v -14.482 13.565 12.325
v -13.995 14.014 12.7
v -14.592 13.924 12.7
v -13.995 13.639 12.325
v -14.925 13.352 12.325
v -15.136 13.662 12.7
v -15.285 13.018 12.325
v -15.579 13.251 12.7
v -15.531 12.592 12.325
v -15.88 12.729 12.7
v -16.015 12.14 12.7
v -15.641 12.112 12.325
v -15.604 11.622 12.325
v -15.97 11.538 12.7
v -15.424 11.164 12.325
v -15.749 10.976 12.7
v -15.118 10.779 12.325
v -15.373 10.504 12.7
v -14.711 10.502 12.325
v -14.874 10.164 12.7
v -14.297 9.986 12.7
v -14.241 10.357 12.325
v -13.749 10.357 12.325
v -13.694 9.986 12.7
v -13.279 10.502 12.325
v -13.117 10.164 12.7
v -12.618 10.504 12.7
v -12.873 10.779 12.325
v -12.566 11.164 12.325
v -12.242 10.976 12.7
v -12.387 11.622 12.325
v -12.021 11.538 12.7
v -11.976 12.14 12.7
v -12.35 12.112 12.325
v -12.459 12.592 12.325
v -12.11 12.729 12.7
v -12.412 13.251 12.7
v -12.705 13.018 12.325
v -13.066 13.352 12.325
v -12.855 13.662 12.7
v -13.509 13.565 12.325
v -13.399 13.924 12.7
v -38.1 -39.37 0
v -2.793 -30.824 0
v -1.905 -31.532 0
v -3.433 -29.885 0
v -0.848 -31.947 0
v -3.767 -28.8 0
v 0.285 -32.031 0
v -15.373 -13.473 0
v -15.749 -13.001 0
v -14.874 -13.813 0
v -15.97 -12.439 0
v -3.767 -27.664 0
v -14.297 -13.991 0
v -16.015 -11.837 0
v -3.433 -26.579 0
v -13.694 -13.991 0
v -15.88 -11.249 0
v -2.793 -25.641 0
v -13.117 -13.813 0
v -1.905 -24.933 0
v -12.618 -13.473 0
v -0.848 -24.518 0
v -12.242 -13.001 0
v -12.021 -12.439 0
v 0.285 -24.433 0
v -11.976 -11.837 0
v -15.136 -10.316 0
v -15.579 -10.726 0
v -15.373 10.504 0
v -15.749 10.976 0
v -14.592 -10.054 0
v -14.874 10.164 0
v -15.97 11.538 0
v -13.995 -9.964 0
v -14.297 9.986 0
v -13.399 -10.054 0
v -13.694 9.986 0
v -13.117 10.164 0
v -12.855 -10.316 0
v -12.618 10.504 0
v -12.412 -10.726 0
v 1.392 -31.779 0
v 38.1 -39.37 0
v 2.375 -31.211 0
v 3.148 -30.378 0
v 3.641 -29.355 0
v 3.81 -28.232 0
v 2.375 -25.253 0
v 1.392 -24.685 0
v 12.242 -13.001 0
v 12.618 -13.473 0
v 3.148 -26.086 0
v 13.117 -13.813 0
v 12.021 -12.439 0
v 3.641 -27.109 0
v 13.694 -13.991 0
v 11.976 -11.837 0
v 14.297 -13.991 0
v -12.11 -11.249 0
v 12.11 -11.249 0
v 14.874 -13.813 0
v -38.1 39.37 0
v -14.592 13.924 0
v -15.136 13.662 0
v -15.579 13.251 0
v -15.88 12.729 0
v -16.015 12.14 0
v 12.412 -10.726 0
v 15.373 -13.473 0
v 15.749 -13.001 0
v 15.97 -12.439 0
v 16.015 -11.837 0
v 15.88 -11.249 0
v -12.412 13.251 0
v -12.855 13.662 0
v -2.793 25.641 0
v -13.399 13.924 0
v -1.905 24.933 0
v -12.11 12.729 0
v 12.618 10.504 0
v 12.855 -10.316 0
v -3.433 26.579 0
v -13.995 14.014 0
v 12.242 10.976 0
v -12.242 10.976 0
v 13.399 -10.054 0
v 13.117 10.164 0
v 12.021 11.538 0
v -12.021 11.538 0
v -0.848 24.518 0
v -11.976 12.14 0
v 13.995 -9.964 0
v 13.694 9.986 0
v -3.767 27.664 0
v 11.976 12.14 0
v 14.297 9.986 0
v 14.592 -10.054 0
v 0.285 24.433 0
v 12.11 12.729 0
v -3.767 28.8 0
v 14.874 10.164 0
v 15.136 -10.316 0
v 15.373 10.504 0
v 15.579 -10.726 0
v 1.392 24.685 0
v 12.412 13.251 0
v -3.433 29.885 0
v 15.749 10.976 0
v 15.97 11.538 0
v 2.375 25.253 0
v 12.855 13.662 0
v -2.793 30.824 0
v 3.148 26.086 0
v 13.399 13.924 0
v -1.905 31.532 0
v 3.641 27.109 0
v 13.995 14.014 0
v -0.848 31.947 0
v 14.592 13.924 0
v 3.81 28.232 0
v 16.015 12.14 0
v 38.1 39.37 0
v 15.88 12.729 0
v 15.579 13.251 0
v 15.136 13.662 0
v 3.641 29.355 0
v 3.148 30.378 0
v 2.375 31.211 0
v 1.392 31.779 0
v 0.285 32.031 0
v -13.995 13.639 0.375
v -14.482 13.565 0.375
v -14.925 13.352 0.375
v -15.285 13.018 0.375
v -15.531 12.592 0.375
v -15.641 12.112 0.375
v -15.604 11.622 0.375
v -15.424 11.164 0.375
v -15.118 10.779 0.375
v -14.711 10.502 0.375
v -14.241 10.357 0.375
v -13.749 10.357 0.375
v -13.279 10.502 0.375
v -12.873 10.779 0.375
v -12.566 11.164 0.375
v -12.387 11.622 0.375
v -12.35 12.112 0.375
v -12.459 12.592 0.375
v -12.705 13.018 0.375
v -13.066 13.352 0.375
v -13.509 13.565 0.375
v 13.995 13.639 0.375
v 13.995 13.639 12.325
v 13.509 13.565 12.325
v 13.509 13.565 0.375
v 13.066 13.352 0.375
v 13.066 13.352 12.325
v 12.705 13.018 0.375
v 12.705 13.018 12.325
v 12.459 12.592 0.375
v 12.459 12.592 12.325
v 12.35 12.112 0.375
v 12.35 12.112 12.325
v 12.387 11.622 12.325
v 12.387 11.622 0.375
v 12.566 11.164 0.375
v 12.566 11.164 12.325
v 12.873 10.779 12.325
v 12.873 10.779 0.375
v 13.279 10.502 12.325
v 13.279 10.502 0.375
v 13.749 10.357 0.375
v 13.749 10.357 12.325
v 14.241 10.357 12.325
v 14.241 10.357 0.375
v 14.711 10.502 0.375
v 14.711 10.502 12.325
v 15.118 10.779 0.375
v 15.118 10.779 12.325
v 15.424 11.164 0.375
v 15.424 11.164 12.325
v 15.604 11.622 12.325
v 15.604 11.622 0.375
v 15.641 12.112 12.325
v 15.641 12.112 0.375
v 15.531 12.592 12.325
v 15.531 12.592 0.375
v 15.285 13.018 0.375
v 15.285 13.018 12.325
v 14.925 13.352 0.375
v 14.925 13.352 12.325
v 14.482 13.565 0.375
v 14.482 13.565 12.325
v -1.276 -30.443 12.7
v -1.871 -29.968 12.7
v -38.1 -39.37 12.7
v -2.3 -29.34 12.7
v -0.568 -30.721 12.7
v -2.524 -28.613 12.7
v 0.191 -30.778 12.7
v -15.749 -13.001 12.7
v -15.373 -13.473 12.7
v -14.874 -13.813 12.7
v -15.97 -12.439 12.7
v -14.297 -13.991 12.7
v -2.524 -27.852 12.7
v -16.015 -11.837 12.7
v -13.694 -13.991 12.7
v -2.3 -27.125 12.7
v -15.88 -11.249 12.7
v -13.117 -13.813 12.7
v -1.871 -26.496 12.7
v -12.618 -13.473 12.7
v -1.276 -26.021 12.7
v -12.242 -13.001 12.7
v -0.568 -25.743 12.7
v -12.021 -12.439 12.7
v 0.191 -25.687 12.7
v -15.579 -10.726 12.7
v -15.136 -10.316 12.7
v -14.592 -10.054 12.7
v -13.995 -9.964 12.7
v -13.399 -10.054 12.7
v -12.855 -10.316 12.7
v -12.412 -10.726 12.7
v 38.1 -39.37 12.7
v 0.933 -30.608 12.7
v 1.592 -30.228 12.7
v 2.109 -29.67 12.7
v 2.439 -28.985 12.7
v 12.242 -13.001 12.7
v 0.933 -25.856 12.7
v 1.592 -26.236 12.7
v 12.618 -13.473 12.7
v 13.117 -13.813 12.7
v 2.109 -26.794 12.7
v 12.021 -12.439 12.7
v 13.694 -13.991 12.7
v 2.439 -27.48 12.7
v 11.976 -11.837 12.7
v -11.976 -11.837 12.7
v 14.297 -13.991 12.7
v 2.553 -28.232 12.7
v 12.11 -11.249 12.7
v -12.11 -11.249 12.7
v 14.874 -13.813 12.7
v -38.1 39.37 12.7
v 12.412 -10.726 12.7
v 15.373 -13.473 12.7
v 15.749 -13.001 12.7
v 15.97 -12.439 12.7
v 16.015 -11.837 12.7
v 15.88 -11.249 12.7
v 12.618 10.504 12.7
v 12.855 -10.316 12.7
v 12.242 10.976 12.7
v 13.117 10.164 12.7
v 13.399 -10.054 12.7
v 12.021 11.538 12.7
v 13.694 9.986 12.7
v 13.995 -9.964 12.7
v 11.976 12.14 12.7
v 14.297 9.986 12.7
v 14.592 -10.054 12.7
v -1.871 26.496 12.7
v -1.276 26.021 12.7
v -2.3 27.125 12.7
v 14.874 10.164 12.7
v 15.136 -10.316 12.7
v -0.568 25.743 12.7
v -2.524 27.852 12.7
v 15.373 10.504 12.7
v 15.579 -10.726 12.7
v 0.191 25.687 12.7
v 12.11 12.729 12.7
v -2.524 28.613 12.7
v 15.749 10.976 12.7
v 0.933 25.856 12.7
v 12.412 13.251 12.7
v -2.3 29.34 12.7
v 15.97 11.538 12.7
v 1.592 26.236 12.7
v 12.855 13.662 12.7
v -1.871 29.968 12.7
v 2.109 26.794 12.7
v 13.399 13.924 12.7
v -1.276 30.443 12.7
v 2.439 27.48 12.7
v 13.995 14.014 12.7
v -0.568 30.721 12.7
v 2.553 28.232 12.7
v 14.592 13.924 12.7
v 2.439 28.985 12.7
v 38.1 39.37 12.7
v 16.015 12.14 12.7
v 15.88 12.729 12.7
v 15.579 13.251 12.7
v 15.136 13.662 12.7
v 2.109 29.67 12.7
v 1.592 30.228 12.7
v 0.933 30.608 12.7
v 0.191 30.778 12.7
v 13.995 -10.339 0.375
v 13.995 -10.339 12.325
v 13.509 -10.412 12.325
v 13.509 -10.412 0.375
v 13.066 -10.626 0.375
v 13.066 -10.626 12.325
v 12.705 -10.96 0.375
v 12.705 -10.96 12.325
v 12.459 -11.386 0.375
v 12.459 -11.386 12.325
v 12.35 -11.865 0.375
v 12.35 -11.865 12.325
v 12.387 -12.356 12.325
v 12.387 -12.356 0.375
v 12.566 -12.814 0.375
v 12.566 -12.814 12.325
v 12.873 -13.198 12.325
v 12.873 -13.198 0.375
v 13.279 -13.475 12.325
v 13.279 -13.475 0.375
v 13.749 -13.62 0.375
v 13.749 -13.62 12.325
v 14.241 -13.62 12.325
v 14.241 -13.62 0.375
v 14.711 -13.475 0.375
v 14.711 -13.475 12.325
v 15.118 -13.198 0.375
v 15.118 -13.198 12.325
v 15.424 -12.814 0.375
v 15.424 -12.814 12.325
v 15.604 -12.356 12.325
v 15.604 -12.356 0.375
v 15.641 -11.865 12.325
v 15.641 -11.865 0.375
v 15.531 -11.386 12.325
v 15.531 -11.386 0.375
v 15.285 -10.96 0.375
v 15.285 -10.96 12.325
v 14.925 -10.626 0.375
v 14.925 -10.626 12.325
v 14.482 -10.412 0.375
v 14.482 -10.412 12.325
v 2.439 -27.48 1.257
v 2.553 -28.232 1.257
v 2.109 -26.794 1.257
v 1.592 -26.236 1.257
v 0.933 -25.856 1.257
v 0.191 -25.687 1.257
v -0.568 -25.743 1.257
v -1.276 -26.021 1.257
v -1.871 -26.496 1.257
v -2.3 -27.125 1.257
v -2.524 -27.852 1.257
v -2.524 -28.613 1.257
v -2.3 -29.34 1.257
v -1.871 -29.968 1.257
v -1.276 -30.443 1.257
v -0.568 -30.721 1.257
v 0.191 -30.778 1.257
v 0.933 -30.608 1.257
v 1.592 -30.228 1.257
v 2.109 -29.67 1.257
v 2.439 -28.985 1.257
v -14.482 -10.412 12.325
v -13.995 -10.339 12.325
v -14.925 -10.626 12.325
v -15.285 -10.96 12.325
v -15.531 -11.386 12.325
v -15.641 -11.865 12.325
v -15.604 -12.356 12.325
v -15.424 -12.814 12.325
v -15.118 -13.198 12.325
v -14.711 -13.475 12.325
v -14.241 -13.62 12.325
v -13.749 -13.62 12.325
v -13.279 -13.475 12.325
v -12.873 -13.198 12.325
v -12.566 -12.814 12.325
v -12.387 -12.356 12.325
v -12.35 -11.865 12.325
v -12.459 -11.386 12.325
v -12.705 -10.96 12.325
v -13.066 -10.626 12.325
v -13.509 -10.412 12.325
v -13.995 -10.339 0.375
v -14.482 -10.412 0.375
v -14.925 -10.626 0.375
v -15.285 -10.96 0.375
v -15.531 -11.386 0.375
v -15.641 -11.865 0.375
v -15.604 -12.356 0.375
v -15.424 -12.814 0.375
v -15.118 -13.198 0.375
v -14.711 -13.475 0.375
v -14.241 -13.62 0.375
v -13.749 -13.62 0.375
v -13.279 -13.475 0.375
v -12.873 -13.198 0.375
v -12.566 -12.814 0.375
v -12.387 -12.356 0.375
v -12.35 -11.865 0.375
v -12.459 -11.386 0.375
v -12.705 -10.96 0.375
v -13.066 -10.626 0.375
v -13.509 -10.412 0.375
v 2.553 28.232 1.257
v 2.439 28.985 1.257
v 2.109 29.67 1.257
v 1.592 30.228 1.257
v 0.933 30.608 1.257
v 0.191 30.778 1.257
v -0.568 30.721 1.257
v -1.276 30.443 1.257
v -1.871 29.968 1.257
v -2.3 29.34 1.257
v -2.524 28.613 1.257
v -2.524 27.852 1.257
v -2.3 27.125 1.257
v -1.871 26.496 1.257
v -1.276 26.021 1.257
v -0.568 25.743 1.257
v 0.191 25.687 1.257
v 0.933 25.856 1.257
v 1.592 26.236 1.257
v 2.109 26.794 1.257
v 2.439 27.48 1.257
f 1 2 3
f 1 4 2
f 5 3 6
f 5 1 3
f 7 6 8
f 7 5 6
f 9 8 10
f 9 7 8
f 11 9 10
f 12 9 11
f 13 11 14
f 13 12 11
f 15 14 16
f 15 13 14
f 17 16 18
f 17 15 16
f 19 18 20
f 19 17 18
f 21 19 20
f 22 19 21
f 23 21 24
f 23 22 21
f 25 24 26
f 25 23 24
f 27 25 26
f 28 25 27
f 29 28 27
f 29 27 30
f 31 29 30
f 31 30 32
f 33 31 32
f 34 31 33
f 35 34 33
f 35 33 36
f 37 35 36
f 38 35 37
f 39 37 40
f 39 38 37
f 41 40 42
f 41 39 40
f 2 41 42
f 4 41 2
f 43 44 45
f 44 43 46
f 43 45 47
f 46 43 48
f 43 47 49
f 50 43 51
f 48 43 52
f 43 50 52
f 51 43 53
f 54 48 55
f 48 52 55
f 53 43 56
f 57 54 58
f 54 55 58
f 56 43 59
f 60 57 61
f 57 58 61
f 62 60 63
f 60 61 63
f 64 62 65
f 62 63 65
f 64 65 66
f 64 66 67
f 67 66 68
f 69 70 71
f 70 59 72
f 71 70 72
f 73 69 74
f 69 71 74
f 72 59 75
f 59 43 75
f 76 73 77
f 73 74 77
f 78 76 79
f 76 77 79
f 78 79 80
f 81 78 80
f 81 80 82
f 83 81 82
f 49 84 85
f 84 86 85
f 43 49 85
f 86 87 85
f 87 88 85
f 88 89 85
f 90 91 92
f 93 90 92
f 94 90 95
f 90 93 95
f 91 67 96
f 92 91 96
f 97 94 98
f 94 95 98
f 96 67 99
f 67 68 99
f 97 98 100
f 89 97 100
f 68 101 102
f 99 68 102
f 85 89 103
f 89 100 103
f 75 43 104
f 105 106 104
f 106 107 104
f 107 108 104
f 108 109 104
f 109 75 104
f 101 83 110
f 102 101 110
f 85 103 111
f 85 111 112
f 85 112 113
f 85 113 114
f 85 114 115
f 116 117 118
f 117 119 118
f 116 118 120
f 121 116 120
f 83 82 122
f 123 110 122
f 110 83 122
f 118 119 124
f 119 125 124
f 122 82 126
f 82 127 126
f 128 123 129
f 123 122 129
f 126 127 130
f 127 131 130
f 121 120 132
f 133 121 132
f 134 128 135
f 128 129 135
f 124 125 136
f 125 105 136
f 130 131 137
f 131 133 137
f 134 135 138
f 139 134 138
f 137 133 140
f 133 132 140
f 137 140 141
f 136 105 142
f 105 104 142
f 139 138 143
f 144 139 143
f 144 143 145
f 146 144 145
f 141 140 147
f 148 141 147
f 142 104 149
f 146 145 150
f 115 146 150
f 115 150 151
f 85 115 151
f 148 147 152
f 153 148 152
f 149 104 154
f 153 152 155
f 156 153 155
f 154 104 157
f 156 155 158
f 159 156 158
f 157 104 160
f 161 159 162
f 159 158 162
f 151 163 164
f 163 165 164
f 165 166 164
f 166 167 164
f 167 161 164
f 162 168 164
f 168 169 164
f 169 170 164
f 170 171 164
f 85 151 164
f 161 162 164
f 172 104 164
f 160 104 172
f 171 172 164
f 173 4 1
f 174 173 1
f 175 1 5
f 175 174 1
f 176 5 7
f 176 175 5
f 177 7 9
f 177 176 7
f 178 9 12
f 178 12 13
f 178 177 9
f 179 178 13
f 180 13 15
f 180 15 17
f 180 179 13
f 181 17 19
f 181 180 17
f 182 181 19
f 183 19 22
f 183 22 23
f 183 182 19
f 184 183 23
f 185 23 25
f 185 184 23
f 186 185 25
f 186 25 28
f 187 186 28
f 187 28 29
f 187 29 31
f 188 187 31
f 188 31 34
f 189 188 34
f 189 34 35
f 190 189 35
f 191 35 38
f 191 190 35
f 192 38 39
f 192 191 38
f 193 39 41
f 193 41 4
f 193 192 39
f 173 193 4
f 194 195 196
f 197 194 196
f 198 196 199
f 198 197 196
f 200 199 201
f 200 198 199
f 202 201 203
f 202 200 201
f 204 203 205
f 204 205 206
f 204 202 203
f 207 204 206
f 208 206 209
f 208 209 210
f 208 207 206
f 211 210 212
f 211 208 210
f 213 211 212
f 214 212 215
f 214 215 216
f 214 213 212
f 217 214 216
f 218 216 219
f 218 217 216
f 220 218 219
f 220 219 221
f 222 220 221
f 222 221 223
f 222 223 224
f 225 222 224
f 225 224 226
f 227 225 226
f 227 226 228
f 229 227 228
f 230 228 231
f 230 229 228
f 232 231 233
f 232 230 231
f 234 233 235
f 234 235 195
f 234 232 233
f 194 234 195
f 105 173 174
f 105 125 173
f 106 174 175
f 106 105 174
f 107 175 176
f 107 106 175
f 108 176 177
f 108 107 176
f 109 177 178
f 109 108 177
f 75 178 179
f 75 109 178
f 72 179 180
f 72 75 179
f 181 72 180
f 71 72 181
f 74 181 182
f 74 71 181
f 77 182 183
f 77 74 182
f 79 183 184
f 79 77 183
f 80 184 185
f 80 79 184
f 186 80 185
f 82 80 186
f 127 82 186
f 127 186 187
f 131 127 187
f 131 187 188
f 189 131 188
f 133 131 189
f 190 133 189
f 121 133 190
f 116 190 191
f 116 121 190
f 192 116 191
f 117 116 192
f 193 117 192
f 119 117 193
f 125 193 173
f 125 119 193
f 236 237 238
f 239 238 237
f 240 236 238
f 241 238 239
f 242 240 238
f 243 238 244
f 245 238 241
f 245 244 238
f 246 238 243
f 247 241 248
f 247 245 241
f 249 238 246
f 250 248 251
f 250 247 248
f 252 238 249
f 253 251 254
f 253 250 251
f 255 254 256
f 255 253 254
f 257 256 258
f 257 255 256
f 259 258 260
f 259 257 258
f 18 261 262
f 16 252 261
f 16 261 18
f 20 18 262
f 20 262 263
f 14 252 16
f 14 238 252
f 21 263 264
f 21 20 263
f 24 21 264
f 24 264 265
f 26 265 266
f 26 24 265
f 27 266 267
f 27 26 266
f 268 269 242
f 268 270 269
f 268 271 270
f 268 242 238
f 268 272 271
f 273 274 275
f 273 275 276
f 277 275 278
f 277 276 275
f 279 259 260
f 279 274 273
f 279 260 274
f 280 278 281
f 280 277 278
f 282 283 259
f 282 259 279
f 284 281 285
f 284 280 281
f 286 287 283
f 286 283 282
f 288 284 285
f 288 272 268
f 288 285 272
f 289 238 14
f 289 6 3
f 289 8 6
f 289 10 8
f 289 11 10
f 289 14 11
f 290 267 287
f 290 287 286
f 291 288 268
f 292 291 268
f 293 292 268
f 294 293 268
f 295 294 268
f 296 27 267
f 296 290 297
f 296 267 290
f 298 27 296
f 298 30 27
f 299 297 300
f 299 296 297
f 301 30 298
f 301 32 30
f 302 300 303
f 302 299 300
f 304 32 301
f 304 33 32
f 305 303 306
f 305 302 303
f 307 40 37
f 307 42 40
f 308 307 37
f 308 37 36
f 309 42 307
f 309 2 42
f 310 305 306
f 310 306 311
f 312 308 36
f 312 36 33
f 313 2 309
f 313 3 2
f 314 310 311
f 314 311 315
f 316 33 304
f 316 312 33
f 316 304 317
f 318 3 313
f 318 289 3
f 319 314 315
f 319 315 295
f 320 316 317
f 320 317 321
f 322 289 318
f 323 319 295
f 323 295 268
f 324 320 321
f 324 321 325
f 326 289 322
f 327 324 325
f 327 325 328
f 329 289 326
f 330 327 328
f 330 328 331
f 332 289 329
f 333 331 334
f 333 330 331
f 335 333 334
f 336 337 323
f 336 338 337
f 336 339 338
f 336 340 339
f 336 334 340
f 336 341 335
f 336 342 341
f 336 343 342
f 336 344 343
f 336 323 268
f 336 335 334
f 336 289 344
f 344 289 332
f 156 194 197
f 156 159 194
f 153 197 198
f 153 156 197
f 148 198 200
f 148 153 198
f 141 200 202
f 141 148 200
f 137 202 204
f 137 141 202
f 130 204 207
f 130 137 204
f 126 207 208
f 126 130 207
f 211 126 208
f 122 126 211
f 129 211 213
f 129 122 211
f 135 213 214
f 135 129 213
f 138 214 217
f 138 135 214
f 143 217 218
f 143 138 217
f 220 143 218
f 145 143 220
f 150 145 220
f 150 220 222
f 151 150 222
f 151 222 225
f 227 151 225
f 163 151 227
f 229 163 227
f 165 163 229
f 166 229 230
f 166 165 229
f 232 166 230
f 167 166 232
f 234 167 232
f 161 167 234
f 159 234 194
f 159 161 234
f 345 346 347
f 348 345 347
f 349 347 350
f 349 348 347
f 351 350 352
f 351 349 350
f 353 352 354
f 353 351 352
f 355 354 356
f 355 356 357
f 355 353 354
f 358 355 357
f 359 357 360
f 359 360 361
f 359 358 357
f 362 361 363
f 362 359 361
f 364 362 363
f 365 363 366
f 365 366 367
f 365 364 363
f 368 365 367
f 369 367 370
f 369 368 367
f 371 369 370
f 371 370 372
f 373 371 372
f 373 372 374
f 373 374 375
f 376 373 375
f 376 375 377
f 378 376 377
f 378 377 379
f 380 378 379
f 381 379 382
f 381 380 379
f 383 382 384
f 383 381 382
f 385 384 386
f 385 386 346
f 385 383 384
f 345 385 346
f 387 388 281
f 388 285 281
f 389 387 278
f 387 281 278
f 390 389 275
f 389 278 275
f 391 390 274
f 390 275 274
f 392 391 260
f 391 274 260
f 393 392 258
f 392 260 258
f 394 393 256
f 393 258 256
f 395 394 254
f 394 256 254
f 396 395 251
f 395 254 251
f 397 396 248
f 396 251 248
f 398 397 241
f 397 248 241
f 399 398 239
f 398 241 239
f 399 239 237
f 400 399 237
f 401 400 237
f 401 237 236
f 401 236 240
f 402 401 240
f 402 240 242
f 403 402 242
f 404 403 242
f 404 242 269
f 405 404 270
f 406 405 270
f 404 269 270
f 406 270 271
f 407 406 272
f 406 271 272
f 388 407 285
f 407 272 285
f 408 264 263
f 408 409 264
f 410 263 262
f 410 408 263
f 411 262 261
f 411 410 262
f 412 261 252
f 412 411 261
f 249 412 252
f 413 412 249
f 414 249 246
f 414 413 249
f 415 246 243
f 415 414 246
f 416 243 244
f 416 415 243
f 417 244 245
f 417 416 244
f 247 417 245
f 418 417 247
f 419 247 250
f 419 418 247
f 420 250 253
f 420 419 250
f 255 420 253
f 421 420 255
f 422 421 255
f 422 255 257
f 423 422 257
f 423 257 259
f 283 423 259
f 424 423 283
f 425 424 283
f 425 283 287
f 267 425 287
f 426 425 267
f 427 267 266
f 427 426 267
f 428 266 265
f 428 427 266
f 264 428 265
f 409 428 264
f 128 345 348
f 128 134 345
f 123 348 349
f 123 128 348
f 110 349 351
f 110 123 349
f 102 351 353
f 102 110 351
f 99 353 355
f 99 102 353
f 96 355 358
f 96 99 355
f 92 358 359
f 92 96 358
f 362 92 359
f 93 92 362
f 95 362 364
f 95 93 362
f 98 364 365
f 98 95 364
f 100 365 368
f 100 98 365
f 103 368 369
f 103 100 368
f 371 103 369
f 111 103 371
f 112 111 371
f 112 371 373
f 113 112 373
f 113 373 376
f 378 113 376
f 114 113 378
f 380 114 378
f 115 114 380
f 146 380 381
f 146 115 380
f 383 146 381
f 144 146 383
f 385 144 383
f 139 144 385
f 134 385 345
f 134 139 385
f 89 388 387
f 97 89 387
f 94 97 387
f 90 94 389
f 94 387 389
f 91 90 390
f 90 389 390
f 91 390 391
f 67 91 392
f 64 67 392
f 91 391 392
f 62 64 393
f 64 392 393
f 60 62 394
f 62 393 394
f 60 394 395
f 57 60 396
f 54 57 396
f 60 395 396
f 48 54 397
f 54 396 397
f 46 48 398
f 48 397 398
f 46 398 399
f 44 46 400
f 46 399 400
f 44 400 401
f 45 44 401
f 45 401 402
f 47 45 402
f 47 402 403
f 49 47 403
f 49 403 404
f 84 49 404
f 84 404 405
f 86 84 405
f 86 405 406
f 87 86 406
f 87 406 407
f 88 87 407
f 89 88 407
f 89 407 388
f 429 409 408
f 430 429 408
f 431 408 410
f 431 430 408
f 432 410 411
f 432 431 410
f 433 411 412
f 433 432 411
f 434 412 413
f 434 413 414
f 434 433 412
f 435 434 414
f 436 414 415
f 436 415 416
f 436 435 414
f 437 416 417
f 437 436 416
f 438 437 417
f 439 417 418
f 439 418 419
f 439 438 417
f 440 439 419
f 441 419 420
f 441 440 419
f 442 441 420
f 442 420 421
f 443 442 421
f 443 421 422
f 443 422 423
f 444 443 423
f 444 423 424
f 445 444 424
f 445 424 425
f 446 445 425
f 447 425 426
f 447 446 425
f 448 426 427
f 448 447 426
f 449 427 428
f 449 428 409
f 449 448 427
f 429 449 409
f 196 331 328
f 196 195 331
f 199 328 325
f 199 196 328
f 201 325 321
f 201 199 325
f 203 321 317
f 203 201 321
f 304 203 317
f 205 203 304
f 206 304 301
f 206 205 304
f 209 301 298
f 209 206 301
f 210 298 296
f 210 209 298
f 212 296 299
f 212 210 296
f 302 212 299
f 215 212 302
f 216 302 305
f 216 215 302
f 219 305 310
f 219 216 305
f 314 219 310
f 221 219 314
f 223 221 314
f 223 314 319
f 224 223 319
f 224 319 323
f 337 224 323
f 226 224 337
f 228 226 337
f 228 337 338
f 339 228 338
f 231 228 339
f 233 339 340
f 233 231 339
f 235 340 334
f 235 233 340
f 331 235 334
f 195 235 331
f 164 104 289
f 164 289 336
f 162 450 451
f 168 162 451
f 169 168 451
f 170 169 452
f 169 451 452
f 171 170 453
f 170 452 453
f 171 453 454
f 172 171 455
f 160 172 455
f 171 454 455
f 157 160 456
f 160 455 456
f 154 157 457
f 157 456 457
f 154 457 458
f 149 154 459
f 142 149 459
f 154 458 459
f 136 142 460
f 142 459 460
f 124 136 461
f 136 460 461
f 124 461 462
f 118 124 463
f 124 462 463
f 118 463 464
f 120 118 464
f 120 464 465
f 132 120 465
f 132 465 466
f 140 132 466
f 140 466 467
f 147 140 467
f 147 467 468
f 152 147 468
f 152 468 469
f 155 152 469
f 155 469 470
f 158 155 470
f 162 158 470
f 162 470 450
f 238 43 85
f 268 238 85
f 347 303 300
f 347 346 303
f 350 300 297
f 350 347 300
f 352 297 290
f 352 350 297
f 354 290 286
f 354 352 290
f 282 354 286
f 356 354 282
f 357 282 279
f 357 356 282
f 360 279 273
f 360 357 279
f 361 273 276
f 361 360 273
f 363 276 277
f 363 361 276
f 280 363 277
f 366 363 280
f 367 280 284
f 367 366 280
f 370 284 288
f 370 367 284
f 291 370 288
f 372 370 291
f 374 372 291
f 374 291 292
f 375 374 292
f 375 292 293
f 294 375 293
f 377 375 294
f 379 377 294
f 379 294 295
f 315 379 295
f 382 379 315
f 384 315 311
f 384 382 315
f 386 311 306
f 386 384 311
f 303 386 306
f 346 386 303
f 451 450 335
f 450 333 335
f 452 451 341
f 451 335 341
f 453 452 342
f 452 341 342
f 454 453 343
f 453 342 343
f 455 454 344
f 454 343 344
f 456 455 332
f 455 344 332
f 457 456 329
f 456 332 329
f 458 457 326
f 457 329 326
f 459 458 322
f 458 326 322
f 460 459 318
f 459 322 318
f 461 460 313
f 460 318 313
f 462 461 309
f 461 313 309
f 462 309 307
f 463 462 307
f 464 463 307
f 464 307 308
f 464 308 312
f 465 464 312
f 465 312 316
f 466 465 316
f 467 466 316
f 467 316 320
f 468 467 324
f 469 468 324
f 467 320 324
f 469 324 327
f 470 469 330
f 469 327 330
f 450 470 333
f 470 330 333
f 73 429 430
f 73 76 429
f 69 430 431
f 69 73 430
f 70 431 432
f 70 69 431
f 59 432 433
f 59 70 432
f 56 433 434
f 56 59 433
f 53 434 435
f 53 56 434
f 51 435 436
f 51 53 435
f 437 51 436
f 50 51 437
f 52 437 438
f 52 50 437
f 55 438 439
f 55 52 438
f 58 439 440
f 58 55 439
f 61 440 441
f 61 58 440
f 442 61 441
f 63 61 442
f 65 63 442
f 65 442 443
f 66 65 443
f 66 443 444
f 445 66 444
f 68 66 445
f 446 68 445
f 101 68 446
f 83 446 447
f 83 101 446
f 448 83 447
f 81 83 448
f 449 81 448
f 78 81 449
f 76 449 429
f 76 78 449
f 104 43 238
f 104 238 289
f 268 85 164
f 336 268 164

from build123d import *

# Parameters (mm, degrees)
SKETCH1_W                         = 76.2
SKETCH1_H                         = 78.74
BOSS_EXTRUDE1_DEPTH               = 12.7
F_1_4_20_TAPPED_HOLE1_D           = 5.1054
F_1_4_20_TAPPED_HOLE1_CSINK_D     = 7.62
F_1_4_20_TAPPED_HOLE1_CSINK_ANGLE = 90
M4_TAPPED_HOLE1_AT_2_COUNT        = 2
M4_TAPPED_HOLE1_AT_2_PITCH        = 27.9908
M4_TAPPED_HOLE1_AT_3_COUNT        = 2
M4_TAPPED_HOLE1_AT_3_PITCH        = 36.856616589
M4_TAPPED_HOLE1_AT_4_COUNT        = 2
M4_TAPPED_HOLE1_AT_4_PITCH        = 23.9776


with BuildPart() as part:
    # Sketch1 → Boss-Extrude1 (new body)
    with BuildSketch(Plane.XY):
        Rectangle(SKETCH1_W, SKETCH1_H)
    extrude(amount=BOSS_EXTRUDE1_DEPTH)

    # 1/4-20 Tapped Hole1 (through all)
    with Locations(Plane(origin=(0, 0, 0), x_dir=(-1, 0, 0), z_dir=(0, 0, -1))):
        with Locations((0, 28.2321), (0, -28.2321)):
            CounterSinkHole(F_1_4_20_TAPPED_HOLE1_D / 2, F_1_4_20_TAPPED_HOLE1_CSINK_D / 2, counter_sink_angle=F_1_4_20_TAPPED_HOLE1_CSINK_ANGLE)

    # Sketch5 → M4 Tapped Hole1 (revolve, cut)
    with BuildSketch(Plane(origin=(13.9954, 11.9888, 0), x_dir=(0, 1, 0), z_dir=(1, 0, 0))):
        Polygon((0, 0), (0, 12.7), (2.025, 12.7), (1.65, 12.325), (1.65, 0.375), (2.025, 0), align=None)
    m4_tapped_hole1 = revolve(axis=Axis((13.9954, 11.9888, -6.35), (0, 0, 1)), mode=Mode.SUBTRACT)

    # M4 Tapped Hole1 at 2: M4 Tapped Hole1 ×2
    with Locations(*[(-i * M4_TAPPED_HOLE1_AT_2_PITCH, 0, 0) for i in range(1, M4_TAPPED_HOLE1_AT_2_COUNT)]):
        add(m4_tapped_hole1, mode=Mode.SUBTRACT)

    # M4 Tapped Hole1 at 3: M4 Tapped Hole1 ×2
    with Locations(*[Vector(-0.7594511539682676, -0.6505643279002215, 0) * (i * M4_TAPPED_HOLE1_AT_3_PITCH) for i in range(1, M4_TAPPED_HOLE1_AT_3_COUNT)]):
        add(m4_tapped_hole1, mode=Mode.SUBTRACT)

    # M4 Tapped Hole1 at 4: M4 Tapped Hole1 ×2
    with Locations(*[(0, -i * M4_TAPPED_HOLE1_AT_4_PITCH, 0) for i in range(1, M4_TAPPED_HOLE1_AT_4_COUNT)]):
        add(m4_tapped_hole1, mode=Mode.SUBTRACT)


solid = part.part
